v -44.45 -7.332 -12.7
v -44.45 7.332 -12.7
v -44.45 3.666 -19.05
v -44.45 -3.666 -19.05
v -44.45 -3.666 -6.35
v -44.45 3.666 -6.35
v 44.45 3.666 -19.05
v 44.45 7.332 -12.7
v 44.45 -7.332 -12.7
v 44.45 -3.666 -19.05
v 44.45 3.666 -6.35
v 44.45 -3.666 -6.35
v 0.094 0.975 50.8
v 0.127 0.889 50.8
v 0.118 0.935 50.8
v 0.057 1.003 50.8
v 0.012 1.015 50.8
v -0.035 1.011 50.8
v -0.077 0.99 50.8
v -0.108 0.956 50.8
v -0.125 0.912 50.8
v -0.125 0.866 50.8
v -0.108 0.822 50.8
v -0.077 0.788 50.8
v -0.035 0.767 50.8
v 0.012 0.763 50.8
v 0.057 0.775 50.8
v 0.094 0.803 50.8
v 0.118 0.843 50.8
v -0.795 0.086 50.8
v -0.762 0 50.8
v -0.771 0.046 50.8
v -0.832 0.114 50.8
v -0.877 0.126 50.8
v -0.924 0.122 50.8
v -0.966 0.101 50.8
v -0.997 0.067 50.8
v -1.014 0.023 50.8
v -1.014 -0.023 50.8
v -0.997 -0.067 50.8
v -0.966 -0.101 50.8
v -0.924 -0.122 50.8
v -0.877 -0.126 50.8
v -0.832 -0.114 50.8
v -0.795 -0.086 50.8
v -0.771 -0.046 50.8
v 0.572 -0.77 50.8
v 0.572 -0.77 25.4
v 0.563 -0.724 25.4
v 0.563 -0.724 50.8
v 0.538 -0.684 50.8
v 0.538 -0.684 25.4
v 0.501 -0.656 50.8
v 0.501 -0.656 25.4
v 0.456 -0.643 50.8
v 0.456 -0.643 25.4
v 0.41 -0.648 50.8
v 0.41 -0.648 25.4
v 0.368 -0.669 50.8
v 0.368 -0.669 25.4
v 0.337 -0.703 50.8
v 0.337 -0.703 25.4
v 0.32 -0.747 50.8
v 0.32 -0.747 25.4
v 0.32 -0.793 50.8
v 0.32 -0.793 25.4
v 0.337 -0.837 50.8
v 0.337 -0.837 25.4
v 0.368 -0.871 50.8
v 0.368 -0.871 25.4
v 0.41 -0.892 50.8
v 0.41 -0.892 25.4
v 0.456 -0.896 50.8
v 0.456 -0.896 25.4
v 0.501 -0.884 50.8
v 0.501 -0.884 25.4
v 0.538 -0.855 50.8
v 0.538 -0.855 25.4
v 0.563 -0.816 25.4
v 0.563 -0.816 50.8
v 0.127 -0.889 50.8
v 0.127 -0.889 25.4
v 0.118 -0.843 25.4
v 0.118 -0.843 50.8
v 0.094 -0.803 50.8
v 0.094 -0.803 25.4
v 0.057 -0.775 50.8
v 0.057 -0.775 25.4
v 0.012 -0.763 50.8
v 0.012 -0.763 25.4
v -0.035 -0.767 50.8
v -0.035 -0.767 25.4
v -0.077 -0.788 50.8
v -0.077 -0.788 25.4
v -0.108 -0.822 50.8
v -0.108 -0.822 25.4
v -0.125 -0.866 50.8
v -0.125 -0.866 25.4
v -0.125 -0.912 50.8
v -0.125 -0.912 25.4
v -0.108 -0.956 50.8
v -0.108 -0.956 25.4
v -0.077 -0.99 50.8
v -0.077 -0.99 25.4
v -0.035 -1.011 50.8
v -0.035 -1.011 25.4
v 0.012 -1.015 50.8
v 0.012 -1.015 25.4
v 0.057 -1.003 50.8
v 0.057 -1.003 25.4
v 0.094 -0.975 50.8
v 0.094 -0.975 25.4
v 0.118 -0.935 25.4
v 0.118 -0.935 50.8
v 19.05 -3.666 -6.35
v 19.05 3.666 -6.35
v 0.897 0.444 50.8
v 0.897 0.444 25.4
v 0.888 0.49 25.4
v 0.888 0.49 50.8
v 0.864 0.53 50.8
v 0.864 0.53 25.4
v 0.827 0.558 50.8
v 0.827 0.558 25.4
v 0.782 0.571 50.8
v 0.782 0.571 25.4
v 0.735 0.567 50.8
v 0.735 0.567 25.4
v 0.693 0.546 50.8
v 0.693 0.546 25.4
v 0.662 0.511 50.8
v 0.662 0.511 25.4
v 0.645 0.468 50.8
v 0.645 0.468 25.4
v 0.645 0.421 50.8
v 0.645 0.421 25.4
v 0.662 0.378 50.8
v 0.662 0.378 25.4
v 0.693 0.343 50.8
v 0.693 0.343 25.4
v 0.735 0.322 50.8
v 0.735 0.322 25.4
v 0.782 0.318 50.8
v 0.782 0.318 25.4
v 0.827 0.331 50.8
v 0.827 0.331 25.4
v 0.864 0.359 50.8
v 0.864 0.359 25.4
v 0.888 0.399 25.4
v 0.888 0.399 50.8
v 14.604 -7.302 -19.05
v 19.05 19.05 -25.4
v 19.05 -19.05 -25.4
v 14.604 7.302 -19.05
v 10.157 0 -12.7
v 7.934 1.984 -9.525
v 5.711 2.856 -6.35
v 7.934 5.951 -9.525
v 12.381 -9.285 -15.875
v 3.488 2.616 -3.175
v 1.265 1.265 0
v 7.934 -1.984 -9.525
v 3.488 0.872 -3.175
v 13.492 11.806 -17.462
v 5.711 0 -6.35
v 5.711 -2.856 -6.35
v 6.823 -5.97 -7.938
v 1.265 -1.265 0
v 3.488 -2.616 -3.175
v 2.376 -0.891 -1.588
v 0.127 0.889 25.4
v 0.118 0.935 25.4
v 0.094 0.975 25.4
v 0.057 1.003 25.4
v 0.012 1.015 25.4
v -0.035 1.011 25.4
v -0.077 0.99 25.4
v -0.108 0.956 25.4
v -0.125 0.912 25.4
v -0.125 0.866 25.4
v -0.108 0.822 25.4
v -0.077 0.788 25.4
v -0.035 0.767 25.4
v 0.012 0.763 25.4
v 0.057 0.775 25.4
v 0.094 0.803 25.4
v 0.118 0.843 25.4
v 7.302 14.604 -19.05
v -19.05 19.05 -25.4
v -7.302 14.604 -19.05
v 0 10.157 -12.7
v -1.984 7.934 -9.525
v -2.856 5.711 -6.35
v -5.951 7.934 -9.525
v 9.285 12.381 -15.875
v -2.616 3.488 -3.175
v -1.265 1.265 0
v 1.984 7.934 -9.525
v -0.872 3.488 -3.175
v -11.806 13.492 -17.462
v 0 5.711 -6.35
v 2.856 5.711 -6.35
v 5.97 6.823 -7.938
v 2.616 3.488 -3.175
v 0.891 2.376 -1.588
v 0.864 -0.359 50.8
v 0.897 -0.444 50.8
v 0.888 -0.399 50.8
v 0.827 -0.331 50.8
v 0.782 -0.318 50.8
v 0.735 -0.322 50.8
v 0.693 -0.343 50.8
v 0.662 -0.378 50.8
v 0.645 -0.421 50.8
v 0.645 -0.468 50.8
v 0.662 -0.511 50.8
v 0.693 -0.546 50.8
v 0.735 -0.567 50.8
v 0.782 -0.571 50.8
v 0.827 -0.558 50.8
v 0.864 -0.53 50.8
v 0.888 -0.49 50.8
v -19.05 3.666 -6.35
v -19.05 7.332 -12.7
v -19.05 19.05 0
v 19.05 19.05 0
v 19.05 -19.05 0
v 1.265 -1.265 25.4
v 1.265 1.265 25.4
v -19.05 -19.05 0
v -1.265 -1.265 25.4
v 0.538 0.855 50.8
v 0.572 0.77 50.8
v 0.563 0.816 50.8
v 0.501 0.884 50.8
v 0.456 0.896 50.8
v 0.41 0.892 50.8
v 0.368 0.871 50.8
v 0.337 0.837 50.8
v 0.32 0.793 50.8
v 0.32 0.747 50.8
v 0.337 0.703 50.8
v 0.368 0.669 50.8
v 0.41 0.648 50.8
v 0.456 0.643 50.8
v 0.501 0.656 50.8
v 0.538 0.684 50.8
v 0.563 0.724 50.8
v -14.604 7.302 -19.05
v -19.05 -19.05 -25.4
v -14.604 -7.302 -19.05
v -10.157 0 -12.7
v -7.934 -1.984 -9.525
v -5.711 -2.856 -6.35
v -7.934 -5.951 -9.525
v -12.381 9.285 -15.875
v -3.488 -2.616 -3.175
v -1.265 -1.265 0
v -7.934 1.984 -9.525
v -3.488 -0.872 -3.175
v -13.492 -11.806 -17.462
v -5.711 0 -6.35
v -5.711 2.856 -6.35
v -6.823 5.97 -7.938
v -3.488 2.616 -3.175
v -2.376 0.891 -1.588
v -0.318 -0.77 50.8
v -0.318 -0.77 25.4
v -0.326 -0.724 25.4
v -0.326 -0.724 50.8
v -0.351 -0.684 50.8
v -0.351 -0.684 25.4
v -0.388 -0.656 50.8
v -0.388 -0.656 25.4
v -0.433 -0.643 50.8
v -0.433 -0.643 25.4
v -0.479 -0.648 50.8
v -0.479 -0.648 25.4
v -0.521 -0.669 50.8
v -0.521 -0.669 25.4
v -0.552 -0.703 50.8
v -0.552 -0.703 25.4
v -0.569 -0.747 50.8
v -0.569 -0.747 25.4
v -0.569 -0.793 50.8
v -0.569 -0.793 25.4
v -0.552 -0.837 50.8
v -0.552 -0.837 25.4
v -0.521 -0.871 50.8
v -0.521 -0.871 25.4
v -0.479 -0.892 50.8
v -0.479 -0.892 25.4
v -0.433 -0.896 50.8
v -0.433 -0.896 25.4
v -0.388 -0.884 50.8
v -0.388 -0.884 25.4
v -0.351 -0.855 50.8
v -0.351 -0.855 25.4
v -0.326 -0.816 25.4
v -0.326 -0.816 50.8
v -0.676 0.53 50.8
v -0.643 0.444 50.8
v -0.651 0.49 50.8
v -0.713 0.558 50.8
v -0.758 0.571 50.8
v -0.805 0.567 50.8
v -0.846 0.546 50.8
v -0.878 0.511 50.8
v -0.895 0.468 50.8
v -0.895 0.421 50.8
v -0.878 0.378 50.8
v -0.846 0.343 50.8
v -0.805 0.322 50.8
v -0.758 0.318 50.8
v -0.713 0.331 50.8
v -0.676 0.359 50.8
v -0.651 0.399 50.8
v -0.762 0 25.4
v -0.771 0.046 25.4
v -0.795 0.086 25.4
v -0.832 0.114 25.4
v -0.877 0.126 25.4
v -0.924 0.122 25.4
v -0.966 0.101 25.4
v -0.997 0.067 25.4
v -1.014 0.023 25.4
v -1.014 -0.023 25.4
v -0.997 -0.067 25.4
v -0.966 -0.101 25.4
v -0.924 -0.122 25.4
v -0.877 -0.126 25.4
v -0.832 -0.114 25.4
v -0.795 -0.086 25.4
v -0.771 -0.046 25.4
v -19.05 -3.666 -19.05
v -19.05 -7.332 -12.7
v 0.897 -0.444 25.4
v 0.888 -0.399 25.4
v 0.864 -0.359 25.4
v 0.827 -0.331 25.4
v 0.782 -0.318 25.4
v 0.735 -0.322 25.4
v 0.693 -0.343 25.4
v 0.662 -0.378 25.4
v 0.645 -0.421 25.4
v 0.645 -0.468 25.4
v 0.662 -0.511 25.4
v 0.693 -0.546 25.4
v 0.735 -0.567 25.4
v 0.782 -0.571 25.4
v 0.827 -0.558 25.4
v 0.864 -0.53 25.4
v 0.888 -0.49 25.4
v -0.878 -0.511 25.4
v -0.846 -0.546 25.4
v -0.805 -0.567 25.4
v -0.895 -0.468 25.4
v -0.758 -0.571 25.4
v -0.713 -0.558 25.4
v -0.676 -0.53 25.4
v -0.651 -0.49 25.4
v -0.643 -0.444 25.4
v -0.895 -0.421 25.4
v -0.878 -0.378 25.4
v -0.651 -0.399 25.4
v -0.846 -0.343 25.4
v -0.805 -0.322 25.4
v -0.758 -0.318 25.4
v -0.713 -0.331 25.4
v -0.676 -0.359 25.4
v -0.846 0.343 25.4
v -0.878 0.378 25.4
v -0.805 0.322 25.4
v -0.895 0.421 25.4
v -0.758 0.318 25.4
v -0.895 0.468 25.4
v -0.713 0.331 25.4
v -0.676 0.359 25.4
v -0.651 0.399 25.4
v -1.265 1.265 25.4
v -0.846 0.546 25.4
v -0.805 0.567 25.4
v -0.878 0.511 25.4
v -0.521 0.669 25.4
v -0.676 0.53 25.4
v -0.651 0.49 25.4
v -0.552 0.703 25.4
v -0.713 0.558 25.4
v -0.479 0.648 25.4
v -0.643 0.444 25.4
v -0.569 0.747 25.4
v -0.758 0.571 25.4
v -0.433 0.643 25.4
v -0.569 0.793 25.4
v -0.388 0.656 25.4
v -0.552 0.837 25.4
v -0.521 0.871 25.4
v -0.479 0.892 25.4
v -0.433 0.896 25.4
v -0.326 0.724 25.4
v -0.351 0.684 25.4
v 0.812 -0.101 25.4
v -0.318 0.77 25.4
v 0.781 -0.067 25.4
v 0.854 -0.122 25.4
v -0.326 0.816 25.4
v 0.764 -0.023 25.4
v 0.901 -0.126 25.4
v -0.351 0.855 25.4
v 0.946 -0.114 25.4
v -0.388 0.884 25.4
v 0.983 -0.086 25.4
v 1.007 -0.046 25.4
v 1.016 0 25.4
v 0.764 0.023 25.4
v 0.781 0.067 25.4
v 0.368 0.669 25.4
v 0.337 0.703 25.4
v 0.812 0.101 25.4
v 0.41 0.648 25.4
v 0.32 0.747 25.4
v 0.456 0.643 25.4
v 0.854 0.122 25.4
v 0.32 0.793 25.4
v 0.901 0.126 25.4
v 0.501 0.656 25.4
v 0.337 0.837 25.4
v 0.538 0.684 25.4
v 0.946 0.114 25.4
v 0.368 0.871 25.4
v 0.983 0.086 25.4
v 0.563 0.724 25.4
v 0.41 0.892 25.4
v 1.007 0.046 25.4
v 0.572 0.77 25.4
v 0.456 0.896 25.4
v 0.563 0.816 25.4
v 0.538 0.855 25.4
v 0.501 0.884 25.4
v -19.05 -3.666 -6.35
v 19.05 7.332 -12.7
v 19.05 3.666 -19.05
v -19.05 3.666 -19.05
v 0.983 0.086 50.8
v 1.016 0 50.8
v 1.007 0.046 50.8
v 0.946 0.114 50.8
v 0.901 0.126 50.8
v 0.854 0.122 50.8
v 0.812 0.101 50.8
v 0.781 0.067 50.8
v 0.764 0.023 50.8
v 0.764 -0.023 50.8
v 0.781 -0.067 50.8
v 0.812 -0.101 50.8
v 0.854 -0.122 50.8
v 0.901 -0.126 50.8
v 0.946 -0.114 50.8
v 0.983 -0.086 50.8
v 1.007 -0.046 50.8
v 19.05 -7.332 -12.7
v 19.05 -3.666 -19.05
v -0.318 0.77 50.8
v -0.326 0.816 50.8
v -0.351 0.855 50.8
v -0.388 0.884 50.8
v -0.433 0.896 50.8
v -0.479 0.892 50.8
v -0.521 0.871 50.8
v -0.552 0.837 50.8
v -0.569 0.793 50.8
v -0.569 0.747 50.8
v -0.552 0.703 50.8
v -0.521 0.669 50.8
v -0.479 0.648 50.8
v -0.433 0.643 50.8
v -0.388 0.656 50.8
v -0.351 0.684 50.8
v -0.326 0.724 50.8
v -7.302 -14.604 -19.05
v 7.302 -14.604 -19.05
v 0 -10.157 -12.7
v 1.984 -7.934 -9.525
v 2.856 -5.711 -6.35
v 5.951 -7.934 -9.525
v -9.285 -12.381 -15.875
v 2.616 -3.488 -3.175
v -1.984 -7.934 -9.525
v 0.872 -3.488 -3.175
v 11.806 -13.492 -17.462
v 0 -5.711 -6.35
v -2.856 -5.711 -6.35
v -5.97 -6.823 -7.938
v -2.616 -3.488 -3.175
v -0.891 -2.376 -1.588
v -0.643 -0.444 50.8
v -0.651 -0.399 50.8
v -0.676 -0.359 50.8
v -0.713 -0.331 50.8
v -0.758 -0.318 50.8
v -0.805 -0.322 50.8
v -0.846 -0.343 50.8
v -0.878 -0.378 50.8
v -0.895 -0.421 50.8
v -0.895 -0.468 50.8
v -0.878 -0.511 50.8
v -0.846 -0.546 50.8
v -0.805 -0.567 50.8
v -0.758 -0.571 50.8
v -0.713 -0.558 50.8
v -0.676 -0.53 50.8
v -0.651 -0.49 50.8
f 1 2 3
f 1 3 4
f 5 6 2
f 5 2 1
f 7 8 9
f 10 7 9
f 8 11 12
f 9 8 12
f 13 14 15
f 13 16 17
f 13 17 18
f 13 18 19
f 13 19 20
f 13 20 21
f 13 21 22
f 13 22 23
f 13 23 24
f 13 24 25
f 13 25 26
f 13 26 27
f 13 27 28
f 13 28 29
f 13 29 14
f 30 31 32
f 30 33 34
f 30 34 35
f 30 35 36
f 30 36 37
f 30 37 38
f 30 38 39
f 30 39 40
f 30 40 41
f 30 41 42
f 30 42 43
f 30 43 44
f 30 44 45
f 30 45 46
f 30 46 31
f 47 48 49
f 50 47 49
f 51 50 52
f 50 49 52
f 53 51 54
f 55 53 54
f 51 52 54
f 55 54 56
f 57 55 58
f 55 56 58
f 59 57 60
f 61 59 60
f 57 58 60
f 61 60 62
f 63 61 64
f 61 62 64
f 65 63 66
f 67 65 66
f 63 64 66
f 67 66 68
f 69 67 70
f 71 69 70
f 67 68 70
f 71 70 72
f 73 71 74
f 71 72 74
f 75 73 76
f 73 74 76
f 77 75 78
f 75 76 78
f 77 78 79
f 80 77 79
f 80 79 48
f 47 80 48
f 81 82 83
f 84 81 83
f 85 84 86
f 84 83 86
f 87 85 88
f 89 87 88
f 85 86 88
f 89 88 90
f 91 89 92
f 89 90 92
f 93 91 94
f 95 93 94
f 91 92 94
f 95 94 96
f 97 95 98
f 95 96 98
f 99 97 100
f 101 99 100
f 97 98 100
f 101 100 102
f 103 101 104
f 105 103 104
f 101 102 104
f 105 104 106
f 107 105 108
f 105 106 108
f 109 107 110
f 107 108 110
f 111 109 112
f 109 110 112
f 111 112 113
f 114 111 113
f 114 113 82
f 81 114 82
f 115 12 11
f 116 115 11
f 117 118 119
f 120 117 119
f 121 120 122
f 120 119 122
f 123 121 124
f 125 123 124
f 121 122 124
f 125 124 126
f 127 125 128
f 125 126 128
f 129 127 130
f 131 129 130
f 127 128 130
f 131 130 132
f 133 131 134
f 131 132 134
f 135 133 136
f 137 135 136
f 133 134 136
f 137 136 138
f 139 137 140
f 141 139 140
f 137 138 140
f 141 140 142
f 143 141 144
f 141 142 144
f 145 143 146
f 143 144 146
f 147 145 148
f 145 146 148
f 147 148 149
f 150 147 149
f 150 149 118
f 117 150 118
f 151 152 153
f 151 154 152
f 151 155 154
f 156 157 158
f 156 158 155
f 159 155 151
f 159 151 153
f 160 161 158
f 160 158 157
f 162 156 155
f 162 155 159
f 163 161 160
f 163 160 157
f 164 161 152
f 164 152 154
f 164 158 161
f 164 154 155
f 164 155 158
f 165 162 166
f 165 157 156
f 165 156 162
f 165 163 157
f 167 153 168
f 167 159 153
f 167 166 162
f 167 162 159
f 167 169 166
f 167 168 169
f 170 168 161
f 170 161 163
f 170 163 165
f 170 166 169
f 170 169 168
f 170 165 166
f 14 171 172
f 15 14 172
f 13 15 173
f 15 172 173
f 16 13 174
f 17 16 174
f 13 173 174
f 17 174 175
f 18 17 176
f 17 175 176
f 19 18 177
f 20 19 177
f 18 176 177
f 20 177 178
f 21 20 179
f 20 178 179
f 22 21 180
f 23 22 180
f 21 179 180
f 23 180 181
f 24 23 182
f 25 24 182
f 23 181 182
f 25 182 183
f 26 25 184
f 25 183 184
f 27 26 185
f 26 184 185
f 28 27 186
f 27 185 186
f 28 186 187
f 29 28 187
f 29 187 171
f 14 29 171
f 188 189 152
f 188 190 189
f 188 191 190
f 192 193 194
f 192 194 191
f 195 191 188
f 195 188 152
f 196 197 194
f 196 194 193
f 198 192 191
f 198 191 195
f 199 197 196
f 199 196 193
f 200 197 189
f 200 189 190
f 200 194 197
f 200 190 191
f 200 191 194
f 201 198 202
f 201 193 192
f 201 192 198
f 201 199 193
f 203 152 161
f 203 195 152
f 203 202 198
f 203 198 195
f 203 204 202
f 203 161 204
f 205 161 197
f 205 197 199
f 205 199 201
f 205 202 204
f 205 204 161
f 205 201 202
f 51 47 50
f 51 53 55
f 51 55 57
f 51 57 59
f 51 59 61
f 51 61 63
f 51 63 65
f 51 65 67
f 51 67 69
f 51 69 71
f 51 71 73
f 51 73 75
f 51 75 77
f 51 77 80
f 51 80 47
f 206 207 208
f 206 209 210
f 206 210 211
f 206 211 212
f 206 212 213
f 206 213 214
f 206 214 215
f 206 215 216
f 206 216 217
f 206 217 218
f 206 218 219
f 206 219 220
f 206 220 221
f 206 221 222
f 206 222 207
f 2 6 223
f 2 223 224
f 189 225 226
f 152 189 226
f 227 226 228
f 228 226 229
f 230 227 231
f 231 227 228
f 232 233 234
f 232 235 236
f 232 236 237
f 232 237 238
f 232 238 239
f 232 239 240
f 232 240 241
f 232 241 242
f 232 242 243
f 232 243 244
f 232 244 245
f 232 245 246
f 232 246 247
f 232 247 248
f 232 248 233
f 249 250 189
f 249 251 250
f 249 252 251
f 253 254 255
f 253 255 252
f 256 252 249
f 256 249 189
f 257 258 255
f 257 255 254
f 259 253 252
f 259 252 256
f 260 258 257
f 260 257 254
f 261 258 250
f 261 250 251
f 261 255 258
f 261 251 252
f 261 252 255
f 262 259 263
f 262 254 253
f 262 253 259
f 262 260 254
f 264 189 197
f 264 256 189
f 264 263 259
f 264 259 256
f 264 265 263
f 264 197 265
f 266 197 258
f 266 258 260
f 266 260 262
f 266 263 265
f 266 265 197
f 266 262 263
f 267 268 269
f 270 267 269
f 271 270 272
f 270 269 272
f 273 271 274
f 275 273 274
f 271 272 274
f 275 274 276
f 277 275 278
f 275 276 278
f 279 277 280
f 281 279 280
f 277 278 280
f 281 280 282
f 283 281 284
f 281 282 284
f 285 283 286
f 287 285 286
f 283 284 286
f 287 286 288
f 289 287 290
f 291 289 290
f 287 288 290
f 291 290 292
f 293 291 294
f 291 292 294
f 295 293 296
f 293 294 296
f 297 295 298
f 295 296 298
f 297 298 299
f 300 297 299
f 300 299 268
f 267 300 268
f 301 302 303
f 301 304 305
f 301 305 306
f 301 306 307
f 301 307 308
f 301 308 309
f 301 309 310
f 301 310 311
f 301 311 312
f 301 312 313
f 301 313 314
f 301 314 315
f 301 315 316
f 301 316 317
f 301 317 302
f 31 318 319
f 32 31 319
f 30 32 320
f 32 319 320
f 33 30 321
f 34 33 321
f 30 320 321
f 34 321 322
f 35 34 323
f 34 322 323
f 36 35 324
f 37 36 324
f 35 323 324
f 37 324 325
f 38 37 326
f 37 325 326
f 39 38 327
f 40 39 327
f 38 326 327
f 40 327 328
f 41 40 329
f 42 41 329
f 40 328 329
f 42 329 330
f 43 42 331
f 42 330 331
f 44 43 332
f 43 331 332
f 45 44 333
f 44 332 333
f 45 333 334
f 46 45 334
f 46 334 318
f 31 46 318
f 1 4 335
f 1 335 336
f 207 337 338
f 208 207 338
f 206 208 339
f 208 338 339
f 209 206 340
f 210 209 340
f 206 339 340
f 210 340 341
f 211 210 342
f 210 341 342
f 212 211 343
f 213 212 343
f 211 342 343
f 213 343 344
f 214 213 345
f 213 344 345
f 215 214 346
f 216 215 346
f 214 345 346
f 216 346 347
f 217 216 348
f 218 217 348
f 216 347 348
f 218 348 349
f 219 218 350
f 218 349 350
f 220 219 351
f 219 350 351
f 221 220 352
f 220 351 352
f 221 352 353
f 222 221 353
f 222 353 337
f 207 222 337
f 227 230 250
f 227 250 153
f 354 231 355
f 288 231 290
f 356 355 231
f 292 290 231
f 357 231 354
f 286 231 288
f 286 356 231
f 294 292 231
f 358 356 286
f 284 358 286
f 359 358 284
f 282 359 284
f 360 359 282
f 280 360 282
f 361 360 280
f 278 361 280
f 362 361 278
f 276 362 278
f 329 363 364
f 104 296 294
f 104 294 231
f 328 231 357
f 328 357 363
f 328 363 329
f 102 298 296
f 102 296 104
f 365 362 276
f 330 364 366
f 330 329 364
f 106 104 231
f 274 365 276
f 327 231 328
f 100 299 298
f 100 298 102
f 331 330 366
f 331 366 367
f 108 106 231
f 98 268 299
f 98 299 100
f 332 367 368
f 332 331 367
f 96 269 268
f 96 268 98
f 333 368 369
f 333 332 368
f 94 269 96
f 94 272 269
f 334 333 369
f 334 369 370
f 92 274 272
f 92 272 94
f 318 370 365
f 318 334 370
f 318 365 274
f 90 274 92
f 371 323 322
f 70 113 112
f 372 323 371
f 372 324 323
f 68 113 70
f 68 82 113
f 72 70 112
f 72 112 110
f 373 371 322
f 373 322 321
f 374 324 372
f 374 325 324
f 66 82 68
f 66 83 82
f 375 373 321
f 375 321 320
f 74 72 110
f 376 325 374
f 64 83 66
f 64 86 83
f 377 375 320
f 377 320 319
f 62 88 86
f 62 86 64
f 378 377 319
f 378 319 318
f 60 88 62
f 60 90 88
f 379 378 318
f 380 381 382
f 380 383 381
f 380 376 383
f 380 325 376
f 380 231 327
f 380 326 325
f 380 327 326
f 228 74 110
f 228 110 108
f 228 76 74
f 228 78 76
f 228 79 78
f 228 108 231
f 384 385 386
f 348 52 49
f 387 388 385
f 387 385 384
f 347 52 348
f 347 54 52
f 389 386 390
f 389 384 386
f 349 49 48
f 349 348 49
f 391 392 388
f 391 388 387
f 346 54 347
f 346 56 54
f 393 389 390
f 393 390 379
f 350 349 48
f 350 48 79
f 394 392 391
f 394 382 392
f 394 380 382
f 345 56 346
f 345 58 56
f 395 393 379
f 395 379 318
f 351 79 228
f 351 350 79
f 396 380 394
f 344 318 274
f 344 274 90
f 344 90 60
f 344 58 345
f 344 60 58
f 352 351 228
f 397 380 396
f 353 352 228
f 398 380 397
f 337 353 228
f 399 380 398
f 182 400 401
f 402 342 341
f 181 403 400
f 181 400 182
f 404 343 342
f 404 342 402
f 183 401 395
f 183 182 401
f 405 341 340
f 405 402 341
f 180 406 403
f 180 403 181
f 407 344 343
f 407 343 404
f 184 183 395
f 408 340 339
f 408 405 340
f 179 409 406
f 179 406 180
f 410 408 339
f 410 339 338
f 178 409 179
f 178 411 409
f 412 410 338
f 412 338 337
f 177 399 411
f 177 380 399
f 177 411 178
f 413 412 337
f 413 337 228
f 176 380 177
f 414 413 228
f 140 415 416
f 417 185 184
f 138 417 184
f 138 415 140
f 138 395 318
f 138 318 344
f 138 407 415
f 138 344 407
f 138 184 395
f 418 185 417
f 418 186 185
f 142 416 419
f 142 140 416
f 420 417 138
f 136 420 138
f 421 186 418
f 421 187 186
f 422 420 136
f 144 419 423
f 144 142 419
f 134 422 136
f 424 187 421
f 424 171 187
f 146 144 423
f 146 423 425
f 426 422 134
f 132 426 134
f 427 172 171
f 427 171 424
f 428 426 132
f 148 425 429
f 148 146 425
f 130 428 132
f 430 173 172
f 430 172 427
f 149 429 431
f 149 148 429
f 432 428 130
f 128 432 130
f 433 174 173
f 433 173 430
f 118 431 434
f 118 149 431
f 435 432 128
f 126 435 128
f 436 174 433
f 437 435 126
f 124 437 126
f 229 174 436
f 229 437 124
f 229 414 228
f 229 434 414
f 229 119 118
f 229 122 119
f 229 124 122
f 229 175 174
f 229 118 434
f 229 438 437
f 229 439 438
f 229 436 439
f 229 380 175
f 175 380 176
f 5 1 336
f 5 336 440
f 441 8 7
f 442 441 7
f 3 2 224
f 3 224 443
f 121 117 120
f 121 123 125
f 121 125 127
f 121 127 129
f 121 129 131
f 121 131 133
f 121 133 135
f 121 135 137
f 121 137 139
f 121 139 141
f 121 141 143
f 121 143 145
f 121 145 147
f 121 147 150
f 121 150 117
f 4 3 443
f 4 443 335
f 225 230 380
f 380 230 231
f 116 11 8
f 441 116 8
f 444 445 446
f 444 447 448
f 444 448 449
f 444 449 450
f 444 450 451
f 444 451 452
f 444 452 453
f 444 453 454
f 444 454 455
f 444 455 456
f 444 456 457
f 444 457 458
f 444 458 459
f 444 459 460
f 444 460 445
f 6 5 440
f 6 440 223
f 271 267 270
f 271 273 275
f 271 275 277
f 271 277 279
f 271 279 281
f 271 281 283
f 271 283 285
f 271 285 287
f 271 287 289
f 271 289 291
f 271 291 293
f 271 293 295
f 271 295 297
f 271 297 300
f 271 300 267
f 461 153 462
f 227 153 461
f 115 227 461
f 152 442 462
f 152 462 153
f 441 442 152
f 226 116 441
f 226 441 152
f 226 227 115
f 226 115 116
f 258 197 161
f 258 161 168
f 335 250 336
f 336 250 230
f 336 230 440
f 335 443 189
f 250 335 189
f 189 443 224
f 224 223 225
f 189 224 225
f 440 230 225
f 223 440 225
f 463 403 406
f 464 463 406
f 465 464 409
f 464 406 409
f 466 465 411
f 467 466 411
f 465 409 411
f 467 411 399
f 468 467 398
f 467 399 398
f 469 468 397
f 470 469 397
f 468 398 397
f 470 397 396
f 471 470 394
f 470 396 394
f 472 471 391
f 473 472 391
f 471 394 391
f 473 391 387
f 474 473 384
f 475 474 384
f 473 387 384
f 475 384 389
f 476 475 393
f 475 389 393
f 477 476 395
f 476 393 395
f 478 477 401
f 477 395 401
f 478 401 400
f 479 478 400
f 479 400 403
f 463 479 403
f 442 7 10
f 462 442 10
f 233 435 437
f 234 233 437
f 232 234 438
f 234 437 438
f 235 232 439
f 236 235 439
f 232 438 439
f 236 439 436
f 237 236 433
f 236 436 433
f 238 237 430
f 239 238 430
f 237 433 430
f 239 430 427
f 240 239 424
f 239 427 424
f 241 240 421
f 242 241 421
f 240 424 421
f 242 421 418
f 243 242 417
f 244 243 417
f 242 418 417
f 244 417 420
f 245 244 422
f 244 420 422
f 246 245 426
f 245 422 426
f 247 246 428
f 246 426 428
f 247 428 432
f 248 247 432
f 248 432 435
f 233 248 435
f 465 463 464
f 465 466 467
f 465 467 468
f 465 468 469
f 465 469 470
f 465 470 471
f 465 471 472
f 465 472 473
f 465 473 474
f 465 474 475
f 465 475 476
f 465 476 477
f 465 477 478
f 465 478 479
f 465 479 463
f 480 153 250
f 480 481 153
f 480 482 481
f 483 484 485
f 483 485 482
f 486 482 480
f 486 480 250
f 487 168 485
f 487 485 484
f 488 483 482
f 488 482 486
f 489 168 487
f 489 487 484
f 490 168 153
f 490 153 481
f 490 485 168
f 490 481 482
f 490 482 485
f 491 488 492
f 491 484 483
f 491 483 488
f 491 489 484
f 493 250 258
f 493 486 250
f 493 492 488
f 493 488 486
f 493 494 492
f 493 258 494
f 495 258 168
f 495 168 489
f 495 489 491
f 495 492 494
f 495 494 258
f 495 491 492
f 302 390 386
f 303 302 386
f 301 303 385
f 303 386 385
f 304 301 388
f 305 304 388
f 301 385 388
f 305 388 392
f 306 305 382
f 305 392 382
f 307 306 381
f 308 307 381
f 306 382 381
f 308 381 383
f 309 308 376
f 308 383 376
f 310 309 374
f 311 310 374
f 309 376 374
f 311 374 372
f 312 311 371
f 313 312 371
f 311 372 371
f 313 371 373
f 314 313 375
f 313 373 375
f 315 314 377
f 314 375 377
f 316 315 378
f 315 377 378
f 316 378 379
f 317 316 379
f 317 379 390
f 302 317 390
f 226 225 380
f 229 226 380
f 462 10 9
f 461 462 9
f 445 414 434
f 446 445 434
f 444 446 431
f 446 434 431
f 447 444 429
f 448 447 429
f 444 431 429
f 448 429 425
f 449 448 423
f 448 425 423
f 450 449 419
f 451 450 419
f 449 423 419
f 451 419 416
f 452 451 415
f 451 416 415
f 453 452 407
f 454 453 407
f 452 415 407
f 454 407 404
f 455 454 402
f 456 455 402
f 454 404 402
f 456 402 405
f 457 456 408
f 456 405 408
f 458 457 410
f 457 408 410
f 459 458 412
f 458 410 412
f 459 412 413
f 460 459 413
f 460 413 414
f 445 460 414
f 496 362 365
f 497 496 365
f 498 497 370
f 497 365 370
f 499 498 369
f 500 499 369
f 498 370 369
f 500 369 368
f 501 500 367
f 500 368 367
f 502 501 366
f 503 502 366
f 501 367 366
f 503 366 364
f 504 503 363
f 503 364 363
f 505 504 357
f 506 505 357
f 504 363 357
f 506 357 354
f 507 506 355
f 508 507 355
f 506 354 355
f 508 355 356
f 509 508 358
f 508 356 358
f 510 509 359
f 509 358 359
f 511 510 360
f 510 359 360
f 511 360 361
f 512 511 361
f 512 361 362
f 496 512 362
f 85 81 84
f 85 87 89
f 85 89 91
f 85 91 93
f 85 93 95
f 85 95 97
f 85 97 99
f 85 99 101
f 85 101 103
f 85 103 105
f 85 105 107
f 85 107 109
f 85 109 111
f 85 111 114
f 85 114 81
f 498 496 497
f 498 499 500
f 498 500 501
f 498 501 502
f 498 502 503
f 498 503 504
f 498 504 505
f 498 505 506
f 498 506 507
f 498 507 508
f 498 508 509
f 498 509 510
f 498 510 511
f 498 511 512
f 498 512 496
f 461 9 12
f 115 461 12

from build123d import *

# Parameters (mm, degrees)
F0_W      = 38.1
F0_H      = 38.1
F1_DEPTH  = 25.4
F1_TAPER  = 35
F2_DEPTH  = 25.4
F2_FACE_W = 38.1
F2_FACE_H = 38.1
F3_DEPTH  = 25.4
F3_TAPER  = 35
F7_DEPTH  = 25.4
F9_R      = 0.127
F10_DEPTH = 25.4


with BuildPart() as f1:
    # F0 (on Top) → F1 (new body)
    with BuildSketch(Plane.XY):
        Rectangle(F0_W, F0_H)
    extrude(amount=F1_DEPTH, taper=F1_TAPER)

    # F2 (add): a face of the model
    f2_faces = [f1.faces().sort_by_distance(p)[0] for p in [
        (0, 0, 0),
    ]]
    extrude(f2_faces, amount=F2_DEPTH)

    # F2_face (on face) → F3 (cut)
    with BuildSketch(Plane(origin=(0, 0, -25.4), x_dir=(1, 0, 0), z_dir=(0, 0, -1))):
        Rectangle(F2_FACE_W, F2_FACE_H)
    extrude(amount=-F3_DEPTH, taper=F3_TAPER, mode=Mode.SUBTRACT)

    # F6 (on face) → F7 (join)
    with BuildSketch(Plane(origin=(-19.05, 0, 0), x_dir=(0, -1, 0), z_dir=(-1, 0, 0))):
        Polygon((3.6661742094, -6.35), (-3.6661742094, -6.35), (-7.3323484187, -12.7), (-3.6661742094, -19.05), (3.6661742094, -19.05), (7.3323484187, -12.7), align=None)
    extrude(amount=F7_DEPTH)

    # F8: F1 across plane


with BuildPart() as f1_1:
    add(f1.part)
    add(f1.part.mirror(Plane.YZ))

    # F9 (on face) → F10 (join)
    with BuildSketch(Plane.XY.offset(25.4)):
        with Locations((0, 0.889)):
            Circle(F9_R)
        with Locations((-0.4445, 0.769896584)):
            Circle(F9_R)
        with Locations((-0.769896584, 0.4445)):
            Circle(F9_R)
        with Locations((-0.889, 0)):
            Circle(F9_R)
        with Locations((-0.769896584, -0.4445)):
            Circle(F9_R)
        with Locations((-0.4445, -0.769896584)):
            Circle(F9_R)
        with Locations((0, -0.889)):
            Circle(F9_R)
        with Locations((0.4445, -0.769896584)):
            Circle(F9_R)
        with Locations((0.769896584, -0.4445)):
            Circle(F9_R)
        with Locations((0.889, 0)):
            Circle(F9_R)
        with Locations((0.769896584, 0.4445)):
            Circle(F9_R)
        with Locations((0.4445, 0.769896584)):
            Circle(F9_R)
    extrude(amount=F10_DEPTH)


solid = f1_1.part
